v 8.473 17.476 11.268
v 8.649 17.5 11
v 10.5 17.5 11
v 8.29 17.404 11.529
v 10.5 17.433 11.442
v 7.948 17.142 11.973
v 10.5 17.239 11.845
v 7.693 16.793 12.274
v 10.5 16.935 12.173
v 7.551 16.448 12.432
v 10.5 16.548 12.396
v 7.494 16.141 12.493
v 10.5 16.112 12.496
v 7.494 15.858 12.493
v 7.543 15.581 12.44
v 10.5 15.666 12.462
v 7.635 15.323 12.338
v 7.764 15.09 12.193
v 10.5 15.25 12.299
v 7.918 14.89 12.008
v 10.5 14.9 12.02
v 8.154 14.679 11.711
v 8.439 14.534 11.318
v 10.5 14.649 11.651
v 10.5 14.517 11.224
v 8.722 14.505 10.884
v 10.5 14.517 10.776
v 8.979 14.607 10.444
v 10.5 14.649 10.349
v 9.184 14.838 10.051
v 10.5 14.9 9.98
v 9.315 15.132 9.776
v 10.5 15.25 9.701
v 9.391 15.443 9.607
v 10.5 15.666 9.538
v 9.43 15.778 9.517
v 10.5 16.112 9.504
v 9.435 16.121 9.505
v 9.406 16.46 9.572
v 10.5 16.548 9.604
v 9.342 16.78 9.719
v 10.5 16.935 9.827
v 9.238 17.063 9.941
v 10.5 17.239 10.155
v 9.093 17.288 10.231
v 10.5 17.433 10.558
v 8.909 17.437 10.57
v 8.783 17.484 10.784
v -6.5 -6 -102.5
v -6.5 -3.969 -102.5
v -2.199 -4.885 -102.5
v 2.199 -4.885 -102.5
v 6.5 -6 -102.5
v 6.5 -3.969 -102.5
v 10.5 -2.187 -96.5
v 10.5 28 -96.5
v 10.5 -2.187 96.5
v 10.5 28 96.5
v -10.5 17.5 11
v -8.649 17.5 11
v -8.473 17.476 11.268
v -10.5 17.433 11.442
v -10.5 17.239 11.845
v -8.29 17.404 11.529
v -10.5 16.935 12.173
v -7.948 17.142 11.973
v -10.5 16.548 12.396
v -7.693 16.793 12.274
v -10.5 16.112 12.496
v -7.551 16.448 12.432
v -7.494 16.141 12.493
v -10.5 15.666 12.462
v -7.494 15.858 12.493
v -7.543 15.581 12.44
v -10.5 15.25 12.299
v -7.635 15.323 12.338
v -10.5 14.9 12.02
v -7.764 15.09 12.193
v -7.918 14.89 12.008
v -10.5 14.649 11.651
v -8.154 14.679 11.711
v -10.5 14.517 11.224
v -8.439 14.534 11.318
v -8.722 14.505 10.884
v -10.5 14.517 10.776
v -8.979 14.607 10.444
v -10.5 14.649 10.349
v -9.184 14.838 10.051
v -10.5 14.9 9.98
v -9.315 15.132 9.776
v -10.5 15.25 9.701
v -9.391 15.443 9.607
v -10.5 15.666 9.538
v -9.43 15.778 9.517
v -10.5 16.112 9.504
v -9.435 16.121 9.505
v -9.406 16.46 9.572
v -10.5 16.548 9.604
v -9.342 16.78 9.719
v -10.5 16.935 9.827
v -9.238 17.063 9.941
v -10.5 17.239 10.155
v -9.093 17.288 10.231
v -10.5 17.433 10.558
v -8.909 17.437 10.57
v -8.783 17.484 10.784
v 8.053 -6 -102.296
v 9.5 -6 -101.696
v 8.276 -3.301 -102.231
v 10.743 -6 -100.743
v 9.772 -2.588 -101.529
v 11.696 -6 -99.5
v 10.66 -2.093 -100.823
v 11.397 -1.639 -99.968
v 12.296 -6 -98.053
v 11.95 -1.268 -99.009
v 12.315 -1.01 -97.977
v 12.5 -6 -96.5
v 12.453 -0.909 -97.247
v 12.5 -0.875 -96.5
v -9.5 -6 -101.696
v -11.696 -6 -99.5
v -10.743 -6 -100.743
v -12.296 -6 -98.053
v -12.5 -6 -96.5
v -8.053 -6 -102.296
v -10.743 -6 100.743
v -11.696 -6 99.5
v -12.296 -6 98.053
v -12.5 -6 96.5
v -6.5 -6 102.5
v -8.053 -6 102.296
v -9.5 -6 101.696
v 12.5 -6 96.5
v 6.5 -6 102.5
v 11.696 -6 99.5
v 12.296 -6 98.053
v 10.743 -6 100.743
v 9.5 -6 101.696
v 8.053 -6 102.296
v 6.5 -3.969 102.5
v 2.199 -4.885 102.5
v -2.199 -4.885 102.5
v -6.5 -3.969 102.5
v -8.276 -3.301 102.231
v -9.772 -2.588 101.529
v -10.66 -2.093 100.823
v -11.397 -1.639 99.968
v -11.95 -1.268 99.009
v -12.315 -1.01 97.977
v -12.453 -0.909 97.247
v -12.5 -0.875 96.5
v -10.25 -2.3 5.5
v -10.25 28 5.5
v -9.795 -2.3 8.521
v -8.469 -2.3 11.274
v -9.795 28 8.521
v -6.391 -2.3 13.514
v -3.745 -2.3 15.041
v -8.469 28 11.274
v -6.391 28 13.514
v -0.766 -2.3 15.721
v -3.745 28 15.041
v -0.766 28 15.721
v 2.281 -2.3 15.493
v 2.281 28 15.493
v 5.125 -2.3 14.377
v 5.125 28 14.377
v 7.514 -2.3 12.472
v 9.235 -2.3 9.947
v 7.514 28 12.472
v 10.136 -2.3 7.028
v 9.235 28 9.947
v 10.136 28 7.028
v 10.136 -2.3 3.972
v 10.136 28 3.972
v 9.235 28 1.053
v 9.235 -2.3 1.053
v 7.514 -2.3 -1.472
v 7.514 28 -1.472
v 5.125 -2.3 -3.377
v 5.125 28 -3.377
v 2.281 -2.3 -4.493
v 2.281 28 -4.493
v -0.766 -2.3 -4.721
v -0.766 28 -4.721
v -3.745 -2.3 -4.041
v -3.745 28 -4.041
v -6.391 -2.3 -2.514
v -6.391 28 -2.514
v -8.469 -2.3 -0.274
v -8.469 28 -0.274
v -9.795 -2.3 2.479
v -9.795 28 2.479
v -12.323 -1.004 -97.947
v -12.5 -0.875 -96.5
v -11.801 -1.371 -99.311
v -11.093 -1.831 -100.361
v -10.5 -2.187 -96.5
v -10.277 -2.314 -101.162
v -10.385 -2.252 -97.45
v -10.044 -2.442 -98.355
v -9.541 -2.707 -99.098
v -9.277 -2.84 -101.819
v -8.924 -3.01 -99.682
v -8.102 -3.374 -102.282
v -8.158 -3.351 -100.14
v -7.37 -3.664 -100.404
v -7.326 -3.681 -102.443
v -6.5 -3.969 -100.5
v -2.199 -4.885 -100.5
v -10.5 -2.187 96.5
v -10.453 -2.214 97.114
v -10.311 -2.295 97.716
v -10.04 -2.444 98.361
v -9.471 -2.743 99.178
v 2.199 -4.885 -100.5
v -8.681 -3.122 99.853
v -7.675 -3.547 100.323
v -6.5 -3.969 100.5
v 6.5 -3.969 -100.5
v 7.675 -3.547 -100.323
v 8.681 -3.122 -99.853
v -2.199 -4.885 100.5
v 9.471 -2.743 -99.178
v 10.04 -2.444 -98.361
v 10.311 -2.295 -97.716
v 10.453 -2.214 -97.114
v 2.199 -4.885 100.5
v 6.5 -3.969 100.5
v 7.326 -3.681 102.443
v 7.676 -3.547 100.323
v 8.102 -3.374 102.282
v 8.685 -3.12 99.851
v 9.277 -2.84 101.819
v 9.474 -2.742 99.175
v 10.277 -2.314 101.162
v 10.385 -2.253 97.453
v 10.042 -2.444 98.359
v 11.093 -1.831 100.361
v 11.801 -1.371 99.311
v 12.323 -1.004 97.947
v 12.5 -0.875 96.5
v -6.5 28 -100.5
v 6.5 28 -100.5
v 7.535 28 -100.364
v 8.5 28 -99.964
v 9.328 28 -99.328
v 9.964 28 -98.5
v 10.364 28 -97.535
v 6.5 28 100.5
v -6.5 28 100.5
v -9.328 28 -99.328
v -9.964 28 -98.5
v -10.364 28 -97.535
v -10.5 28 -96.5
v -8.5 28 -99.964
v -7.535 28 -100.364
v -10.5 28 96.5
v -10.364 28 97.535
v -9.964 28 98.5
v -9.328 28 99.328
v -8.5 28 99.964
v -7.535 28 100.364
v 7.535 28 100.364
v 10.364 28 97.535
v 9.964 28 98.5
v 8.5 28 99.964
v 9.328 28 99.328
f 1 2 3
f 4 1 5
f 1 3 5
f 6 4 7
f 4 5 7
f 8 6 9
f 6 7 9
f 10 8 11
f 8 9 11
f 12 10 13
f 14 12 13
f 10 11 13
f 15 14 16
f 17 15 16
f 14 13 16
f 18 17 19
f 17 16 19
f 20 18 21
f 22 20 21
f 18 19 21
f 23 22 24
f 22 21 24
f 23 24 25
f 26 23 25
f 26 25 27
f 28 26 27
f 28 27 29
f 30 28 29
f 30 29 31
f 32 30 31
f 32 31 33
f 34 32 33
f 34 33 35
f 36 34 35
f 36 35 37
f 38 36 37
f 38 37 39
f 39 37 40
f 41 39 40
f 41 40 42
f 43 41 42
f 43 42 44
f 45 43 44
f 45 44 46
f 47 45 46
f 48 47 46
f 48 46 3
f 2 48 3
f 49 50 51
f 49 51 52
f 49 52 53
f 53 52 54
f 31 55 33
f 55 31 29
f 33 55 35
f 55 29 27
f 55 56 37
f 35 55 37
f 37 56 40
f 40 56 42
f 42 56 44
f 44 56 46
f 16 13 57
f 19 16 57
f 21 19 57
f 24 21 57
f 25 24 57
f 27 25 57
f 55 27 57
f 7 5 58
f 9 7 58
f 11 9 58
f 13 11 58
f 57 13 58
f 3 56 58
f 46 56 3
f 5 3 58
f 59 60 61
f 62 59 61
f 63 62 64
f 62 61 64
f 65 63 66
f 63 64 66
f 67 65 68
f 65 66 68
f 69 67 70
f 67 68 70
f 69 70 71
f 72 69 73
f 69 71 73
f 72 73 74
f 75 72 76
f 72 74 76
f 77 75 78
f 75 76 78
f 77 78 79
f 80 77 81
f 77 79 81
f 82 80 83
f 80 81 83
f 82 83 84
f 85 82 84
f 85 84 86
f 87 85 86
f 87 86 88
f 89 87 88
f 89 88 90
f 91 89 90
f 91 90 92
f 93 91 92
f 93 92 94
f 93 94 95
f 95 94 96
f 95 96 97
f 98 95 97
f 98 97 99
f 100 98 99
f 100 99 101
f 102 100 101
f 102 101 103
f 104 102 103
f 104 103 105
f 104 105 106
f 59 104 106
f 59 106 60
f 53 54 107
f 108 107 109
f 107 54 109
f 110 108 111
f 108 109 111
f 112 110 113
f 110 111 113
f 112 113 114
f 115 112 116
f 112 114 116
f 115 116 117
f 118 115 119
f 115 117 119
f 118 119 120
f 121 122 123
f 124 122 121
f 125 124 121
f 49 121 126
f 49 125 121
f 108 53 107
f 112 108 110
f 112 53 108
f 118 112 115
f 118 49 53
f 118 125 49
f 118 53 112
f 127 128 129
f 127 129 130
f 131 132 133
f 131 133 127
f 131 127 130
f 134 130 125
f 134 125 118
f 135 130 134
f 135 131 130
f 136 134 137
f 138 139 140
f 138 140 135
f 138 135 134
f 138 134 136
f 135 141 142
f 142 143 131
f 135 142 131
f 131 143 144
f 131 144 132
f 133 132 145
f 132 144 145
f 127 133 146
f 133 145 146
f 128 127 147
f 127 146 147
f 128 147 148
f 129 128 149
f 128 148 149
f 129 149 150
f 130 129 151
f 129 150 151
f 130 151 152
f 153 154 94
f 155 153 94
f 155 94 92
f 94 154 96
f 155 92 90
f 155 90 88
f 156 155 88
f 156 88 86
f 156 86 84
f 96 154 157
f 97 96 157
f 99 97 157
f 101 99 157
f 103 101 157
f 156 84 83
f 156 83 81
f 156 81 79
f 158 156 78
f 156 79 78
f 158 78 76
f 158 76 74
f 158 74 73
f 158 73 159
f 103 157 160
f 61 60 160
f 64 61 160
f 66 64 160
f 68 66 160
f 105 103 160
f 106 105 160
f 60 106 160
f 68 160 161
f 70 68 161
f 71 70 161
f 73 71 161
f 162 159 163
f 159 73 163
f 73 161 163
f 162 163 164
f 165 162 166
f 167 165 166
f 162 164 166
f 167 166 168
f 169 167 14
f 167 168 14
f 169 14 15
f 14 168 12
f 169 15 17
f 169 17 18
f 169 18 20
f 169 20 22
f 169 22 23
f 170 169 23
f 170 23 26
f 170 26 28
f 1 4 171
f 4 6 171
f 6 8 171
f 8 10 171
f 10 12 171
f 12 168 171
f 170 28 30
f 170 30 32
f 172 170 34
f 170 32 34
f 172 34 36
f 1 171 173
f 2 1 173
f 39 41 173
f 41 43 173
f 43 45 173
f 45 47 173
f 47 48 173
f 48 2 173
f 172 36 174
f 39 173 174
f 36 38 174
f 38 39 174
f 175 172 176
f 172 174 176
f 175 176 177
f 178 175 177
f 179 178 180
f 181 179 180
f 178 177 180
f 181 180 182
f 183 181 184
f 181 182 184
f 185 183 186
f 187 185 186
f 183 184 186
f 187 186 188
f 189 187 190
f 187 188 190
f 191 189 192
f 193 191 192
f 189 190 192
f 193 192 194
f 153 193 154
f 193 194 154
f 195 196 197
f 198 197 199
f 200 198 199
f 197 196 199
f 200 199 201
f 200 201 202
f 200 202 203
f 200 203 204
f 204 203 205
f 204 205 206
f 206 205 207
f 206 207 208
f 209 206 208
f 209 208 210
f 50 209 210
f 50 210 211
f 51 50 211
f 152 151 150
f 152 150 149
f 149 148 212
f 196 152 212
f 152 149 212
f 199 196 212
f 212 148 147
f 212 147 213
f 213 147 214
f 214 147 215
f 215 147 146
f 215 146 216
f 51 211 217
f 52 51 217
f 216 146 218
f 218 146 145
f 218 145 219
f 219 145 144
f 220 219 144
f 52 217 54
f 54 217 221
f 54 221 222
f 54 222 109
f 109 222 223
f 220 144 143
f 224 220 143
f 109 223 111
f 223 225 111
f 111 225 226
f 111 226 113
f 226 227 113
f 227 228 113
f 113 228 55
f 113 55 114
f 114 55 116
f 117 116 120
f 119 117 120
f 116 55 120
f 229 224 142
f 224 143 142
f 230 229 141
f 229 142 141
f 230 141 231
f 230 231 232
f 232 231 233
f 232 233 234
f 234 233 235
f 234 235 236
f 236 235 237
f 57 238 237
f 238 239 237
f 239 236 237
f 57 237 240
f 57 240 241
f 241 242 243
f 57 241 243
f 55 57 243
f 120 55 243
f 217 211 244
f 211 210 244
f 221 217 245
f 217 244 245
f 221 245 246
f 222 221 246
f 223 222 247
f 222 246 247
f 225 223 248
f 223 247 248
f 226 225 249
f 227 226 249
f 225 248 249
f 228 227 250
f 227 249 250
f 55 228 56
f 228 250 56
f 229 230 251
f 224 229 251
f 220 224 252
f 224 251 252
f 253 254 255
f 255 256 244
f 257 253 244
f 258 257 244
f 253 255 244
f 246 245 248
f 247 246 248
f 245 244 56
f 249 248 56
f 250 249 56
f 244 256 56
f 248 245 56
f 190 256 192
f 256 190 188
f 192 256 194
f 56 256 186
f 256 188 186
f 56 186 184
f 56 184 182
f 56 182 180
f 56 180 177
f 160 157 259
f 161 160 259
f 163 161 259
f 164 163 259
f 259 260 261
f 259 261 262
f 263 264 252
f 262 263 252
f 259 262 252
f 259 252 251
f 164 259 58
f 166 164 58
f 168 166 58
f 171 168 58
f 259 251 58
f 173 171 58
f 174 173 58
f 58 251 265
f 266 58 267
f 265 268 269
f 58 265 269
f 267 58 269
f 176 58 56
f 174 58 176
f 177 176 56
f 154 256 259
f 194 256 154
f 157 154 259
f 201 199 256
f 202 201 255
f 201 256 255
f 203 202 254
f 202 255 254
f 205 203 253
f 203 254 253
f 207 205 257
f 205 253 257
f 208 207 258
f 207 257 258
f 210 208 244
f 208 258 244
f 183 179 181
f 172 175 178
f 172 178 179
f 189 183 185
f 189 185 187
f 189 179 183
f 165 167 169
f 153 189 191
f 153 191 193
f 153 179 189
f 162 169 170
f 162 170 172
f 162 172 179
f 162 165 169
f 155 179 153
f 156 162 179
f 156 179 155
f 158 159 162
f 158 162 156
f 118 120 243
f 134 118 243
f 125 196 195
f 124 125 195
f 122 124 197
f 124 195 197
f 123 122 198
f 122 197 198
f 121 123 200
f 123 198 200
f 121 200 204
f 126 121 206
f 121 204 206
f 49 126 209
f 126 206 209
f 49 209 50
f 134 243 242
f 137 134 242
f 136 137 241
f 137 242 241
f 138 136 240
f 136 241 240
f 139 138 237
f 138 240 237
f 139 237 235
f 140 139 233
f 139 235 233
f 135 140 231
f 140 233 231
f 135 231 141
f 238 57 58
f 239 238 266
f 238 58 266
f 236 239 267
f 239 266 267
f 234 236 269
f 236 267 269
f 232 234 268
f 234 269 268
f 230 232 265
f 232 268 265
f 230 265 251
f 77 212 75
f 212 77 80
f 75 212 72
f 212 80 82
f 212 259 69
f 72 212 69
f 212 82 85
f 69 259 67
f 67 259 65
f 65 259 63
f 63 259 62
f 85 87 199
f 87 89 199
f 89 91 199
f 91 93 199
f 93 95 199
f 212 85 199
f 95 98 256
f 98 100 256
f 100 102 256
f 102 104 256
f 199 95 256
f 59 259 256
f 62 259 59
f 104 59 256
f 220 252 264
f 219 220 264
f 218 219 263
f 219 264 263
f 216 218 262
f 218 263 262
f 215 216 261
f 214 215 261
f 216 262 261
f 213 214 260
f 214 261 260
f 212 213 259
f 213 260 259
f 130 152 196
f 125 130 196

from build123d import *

# Parameters (mm, degrees)
F2_DEPTH      = 6
F3_R          = 21
F4_DEPTH      = 102.501
F4_DEPTH_BACK = 102.501
F5_DEPTH      = 28
F5_DEPTH_BACK = 5
F6_R          = 10.25
F7_DEPTH      = 30.3
F9_D          = 3


with BuildPart() as f2:
    # F1 (on Front) → F2 (new body)
    with BuildSketch(Plane.XZ):
        with BuildLine():
            ThreePointArc((6.5, -102.5), (10.7426406871, -100.7426406871), (12.5, -96.5))
            Line((12.5, -96.5), (12.5, 96.5))
            ThreePointArc((12.5, 96.5), (10.7426406871, 100.7426406871), (6.5, 102.5))
            Line((6.5, 102.5), (-6.5, 102.5))
            ThreePointArc((-6.5, 102.5), (-10.7426406871, 100.7426406871), (-12.5, 96.5))
            Line((-12.5, 96.5), (-12.5, -96.5))
            ThreePointArc((-12.5, -96.5), (-10.7426406871, -100.7426406871), (-6.5, -102.5))
            Line((-6.5, -102.5), (6.5, -102.5))
        make_face()
    extrude(amount=F2_DEPTH)

    # F3 (on Top) → F4 (cut, two sides)
    with BuildSketch(Plane.XY) as f4_sk:
        with Locations((0, 16)):
            Circle(F3_R)
    extrude(amount=-F4_DEPTH, mode=Mode.SUBTRACT)
    extrude(f4_sk.sketch, amount=F4_DEPTH_BACK, mode=Mode.SUBTRACT)

    # F0 (on Front) → F5 (join, two sides)
    with BuildSketch(Plane.XZ) as f5_sk:
        with BuildLine():
            Line((-6.5, -100.5), (6.5, -100.5))
            ThreePointArc((6.5, -100.5), (9.3284271247, -99.3284271247), (10.5, -96.5))
            Line((10.5, -96.5), (10.5, 96.5))
            ThreePointArc((10.5, 96.5), (9.3284271247, 99.3284271247), (6.5, 100.5))
            Line((6.5, 100.5), (-6.5, 100.5))
            ThreePointArc((-6.5, 100.5), (-9.3284271247, 99.3284271247), (-10.5, 96.5))
            Line((-10.5, 96.5), (-10.5, -96.5))
            ThreePointArc((-10.5, -96.5), (-9.3284271247, -99.3284271247), (-6.5, -100.5))
        make_face()
    extrude(amount=-F5_DEPTH)
    extrude(f5_sk.sketch, amount=F5_DEPTH_BACK)

    # F6 (on face) → F7 (cut)
    with BuildSketch(Plane(origin=(0, 28, 0), x_dir=(-1, 0, 0), z_dir=(0, 1, 0))):
        with Locations((0, 5.5)):
            Circle(F6_R)
    extrude(amount=-F7_DEPTH, mode=Mode.SUBTRACT)

    # F9 (through all)
    with Locations(Plane(origin=(-10.5, 0, 0), x_dir=(0, -1, 0), z_dir=(-1, 0, 0))):
        with Locations((-16, 11)):
            Hole(F9_D / 2)


solid = f2.part
